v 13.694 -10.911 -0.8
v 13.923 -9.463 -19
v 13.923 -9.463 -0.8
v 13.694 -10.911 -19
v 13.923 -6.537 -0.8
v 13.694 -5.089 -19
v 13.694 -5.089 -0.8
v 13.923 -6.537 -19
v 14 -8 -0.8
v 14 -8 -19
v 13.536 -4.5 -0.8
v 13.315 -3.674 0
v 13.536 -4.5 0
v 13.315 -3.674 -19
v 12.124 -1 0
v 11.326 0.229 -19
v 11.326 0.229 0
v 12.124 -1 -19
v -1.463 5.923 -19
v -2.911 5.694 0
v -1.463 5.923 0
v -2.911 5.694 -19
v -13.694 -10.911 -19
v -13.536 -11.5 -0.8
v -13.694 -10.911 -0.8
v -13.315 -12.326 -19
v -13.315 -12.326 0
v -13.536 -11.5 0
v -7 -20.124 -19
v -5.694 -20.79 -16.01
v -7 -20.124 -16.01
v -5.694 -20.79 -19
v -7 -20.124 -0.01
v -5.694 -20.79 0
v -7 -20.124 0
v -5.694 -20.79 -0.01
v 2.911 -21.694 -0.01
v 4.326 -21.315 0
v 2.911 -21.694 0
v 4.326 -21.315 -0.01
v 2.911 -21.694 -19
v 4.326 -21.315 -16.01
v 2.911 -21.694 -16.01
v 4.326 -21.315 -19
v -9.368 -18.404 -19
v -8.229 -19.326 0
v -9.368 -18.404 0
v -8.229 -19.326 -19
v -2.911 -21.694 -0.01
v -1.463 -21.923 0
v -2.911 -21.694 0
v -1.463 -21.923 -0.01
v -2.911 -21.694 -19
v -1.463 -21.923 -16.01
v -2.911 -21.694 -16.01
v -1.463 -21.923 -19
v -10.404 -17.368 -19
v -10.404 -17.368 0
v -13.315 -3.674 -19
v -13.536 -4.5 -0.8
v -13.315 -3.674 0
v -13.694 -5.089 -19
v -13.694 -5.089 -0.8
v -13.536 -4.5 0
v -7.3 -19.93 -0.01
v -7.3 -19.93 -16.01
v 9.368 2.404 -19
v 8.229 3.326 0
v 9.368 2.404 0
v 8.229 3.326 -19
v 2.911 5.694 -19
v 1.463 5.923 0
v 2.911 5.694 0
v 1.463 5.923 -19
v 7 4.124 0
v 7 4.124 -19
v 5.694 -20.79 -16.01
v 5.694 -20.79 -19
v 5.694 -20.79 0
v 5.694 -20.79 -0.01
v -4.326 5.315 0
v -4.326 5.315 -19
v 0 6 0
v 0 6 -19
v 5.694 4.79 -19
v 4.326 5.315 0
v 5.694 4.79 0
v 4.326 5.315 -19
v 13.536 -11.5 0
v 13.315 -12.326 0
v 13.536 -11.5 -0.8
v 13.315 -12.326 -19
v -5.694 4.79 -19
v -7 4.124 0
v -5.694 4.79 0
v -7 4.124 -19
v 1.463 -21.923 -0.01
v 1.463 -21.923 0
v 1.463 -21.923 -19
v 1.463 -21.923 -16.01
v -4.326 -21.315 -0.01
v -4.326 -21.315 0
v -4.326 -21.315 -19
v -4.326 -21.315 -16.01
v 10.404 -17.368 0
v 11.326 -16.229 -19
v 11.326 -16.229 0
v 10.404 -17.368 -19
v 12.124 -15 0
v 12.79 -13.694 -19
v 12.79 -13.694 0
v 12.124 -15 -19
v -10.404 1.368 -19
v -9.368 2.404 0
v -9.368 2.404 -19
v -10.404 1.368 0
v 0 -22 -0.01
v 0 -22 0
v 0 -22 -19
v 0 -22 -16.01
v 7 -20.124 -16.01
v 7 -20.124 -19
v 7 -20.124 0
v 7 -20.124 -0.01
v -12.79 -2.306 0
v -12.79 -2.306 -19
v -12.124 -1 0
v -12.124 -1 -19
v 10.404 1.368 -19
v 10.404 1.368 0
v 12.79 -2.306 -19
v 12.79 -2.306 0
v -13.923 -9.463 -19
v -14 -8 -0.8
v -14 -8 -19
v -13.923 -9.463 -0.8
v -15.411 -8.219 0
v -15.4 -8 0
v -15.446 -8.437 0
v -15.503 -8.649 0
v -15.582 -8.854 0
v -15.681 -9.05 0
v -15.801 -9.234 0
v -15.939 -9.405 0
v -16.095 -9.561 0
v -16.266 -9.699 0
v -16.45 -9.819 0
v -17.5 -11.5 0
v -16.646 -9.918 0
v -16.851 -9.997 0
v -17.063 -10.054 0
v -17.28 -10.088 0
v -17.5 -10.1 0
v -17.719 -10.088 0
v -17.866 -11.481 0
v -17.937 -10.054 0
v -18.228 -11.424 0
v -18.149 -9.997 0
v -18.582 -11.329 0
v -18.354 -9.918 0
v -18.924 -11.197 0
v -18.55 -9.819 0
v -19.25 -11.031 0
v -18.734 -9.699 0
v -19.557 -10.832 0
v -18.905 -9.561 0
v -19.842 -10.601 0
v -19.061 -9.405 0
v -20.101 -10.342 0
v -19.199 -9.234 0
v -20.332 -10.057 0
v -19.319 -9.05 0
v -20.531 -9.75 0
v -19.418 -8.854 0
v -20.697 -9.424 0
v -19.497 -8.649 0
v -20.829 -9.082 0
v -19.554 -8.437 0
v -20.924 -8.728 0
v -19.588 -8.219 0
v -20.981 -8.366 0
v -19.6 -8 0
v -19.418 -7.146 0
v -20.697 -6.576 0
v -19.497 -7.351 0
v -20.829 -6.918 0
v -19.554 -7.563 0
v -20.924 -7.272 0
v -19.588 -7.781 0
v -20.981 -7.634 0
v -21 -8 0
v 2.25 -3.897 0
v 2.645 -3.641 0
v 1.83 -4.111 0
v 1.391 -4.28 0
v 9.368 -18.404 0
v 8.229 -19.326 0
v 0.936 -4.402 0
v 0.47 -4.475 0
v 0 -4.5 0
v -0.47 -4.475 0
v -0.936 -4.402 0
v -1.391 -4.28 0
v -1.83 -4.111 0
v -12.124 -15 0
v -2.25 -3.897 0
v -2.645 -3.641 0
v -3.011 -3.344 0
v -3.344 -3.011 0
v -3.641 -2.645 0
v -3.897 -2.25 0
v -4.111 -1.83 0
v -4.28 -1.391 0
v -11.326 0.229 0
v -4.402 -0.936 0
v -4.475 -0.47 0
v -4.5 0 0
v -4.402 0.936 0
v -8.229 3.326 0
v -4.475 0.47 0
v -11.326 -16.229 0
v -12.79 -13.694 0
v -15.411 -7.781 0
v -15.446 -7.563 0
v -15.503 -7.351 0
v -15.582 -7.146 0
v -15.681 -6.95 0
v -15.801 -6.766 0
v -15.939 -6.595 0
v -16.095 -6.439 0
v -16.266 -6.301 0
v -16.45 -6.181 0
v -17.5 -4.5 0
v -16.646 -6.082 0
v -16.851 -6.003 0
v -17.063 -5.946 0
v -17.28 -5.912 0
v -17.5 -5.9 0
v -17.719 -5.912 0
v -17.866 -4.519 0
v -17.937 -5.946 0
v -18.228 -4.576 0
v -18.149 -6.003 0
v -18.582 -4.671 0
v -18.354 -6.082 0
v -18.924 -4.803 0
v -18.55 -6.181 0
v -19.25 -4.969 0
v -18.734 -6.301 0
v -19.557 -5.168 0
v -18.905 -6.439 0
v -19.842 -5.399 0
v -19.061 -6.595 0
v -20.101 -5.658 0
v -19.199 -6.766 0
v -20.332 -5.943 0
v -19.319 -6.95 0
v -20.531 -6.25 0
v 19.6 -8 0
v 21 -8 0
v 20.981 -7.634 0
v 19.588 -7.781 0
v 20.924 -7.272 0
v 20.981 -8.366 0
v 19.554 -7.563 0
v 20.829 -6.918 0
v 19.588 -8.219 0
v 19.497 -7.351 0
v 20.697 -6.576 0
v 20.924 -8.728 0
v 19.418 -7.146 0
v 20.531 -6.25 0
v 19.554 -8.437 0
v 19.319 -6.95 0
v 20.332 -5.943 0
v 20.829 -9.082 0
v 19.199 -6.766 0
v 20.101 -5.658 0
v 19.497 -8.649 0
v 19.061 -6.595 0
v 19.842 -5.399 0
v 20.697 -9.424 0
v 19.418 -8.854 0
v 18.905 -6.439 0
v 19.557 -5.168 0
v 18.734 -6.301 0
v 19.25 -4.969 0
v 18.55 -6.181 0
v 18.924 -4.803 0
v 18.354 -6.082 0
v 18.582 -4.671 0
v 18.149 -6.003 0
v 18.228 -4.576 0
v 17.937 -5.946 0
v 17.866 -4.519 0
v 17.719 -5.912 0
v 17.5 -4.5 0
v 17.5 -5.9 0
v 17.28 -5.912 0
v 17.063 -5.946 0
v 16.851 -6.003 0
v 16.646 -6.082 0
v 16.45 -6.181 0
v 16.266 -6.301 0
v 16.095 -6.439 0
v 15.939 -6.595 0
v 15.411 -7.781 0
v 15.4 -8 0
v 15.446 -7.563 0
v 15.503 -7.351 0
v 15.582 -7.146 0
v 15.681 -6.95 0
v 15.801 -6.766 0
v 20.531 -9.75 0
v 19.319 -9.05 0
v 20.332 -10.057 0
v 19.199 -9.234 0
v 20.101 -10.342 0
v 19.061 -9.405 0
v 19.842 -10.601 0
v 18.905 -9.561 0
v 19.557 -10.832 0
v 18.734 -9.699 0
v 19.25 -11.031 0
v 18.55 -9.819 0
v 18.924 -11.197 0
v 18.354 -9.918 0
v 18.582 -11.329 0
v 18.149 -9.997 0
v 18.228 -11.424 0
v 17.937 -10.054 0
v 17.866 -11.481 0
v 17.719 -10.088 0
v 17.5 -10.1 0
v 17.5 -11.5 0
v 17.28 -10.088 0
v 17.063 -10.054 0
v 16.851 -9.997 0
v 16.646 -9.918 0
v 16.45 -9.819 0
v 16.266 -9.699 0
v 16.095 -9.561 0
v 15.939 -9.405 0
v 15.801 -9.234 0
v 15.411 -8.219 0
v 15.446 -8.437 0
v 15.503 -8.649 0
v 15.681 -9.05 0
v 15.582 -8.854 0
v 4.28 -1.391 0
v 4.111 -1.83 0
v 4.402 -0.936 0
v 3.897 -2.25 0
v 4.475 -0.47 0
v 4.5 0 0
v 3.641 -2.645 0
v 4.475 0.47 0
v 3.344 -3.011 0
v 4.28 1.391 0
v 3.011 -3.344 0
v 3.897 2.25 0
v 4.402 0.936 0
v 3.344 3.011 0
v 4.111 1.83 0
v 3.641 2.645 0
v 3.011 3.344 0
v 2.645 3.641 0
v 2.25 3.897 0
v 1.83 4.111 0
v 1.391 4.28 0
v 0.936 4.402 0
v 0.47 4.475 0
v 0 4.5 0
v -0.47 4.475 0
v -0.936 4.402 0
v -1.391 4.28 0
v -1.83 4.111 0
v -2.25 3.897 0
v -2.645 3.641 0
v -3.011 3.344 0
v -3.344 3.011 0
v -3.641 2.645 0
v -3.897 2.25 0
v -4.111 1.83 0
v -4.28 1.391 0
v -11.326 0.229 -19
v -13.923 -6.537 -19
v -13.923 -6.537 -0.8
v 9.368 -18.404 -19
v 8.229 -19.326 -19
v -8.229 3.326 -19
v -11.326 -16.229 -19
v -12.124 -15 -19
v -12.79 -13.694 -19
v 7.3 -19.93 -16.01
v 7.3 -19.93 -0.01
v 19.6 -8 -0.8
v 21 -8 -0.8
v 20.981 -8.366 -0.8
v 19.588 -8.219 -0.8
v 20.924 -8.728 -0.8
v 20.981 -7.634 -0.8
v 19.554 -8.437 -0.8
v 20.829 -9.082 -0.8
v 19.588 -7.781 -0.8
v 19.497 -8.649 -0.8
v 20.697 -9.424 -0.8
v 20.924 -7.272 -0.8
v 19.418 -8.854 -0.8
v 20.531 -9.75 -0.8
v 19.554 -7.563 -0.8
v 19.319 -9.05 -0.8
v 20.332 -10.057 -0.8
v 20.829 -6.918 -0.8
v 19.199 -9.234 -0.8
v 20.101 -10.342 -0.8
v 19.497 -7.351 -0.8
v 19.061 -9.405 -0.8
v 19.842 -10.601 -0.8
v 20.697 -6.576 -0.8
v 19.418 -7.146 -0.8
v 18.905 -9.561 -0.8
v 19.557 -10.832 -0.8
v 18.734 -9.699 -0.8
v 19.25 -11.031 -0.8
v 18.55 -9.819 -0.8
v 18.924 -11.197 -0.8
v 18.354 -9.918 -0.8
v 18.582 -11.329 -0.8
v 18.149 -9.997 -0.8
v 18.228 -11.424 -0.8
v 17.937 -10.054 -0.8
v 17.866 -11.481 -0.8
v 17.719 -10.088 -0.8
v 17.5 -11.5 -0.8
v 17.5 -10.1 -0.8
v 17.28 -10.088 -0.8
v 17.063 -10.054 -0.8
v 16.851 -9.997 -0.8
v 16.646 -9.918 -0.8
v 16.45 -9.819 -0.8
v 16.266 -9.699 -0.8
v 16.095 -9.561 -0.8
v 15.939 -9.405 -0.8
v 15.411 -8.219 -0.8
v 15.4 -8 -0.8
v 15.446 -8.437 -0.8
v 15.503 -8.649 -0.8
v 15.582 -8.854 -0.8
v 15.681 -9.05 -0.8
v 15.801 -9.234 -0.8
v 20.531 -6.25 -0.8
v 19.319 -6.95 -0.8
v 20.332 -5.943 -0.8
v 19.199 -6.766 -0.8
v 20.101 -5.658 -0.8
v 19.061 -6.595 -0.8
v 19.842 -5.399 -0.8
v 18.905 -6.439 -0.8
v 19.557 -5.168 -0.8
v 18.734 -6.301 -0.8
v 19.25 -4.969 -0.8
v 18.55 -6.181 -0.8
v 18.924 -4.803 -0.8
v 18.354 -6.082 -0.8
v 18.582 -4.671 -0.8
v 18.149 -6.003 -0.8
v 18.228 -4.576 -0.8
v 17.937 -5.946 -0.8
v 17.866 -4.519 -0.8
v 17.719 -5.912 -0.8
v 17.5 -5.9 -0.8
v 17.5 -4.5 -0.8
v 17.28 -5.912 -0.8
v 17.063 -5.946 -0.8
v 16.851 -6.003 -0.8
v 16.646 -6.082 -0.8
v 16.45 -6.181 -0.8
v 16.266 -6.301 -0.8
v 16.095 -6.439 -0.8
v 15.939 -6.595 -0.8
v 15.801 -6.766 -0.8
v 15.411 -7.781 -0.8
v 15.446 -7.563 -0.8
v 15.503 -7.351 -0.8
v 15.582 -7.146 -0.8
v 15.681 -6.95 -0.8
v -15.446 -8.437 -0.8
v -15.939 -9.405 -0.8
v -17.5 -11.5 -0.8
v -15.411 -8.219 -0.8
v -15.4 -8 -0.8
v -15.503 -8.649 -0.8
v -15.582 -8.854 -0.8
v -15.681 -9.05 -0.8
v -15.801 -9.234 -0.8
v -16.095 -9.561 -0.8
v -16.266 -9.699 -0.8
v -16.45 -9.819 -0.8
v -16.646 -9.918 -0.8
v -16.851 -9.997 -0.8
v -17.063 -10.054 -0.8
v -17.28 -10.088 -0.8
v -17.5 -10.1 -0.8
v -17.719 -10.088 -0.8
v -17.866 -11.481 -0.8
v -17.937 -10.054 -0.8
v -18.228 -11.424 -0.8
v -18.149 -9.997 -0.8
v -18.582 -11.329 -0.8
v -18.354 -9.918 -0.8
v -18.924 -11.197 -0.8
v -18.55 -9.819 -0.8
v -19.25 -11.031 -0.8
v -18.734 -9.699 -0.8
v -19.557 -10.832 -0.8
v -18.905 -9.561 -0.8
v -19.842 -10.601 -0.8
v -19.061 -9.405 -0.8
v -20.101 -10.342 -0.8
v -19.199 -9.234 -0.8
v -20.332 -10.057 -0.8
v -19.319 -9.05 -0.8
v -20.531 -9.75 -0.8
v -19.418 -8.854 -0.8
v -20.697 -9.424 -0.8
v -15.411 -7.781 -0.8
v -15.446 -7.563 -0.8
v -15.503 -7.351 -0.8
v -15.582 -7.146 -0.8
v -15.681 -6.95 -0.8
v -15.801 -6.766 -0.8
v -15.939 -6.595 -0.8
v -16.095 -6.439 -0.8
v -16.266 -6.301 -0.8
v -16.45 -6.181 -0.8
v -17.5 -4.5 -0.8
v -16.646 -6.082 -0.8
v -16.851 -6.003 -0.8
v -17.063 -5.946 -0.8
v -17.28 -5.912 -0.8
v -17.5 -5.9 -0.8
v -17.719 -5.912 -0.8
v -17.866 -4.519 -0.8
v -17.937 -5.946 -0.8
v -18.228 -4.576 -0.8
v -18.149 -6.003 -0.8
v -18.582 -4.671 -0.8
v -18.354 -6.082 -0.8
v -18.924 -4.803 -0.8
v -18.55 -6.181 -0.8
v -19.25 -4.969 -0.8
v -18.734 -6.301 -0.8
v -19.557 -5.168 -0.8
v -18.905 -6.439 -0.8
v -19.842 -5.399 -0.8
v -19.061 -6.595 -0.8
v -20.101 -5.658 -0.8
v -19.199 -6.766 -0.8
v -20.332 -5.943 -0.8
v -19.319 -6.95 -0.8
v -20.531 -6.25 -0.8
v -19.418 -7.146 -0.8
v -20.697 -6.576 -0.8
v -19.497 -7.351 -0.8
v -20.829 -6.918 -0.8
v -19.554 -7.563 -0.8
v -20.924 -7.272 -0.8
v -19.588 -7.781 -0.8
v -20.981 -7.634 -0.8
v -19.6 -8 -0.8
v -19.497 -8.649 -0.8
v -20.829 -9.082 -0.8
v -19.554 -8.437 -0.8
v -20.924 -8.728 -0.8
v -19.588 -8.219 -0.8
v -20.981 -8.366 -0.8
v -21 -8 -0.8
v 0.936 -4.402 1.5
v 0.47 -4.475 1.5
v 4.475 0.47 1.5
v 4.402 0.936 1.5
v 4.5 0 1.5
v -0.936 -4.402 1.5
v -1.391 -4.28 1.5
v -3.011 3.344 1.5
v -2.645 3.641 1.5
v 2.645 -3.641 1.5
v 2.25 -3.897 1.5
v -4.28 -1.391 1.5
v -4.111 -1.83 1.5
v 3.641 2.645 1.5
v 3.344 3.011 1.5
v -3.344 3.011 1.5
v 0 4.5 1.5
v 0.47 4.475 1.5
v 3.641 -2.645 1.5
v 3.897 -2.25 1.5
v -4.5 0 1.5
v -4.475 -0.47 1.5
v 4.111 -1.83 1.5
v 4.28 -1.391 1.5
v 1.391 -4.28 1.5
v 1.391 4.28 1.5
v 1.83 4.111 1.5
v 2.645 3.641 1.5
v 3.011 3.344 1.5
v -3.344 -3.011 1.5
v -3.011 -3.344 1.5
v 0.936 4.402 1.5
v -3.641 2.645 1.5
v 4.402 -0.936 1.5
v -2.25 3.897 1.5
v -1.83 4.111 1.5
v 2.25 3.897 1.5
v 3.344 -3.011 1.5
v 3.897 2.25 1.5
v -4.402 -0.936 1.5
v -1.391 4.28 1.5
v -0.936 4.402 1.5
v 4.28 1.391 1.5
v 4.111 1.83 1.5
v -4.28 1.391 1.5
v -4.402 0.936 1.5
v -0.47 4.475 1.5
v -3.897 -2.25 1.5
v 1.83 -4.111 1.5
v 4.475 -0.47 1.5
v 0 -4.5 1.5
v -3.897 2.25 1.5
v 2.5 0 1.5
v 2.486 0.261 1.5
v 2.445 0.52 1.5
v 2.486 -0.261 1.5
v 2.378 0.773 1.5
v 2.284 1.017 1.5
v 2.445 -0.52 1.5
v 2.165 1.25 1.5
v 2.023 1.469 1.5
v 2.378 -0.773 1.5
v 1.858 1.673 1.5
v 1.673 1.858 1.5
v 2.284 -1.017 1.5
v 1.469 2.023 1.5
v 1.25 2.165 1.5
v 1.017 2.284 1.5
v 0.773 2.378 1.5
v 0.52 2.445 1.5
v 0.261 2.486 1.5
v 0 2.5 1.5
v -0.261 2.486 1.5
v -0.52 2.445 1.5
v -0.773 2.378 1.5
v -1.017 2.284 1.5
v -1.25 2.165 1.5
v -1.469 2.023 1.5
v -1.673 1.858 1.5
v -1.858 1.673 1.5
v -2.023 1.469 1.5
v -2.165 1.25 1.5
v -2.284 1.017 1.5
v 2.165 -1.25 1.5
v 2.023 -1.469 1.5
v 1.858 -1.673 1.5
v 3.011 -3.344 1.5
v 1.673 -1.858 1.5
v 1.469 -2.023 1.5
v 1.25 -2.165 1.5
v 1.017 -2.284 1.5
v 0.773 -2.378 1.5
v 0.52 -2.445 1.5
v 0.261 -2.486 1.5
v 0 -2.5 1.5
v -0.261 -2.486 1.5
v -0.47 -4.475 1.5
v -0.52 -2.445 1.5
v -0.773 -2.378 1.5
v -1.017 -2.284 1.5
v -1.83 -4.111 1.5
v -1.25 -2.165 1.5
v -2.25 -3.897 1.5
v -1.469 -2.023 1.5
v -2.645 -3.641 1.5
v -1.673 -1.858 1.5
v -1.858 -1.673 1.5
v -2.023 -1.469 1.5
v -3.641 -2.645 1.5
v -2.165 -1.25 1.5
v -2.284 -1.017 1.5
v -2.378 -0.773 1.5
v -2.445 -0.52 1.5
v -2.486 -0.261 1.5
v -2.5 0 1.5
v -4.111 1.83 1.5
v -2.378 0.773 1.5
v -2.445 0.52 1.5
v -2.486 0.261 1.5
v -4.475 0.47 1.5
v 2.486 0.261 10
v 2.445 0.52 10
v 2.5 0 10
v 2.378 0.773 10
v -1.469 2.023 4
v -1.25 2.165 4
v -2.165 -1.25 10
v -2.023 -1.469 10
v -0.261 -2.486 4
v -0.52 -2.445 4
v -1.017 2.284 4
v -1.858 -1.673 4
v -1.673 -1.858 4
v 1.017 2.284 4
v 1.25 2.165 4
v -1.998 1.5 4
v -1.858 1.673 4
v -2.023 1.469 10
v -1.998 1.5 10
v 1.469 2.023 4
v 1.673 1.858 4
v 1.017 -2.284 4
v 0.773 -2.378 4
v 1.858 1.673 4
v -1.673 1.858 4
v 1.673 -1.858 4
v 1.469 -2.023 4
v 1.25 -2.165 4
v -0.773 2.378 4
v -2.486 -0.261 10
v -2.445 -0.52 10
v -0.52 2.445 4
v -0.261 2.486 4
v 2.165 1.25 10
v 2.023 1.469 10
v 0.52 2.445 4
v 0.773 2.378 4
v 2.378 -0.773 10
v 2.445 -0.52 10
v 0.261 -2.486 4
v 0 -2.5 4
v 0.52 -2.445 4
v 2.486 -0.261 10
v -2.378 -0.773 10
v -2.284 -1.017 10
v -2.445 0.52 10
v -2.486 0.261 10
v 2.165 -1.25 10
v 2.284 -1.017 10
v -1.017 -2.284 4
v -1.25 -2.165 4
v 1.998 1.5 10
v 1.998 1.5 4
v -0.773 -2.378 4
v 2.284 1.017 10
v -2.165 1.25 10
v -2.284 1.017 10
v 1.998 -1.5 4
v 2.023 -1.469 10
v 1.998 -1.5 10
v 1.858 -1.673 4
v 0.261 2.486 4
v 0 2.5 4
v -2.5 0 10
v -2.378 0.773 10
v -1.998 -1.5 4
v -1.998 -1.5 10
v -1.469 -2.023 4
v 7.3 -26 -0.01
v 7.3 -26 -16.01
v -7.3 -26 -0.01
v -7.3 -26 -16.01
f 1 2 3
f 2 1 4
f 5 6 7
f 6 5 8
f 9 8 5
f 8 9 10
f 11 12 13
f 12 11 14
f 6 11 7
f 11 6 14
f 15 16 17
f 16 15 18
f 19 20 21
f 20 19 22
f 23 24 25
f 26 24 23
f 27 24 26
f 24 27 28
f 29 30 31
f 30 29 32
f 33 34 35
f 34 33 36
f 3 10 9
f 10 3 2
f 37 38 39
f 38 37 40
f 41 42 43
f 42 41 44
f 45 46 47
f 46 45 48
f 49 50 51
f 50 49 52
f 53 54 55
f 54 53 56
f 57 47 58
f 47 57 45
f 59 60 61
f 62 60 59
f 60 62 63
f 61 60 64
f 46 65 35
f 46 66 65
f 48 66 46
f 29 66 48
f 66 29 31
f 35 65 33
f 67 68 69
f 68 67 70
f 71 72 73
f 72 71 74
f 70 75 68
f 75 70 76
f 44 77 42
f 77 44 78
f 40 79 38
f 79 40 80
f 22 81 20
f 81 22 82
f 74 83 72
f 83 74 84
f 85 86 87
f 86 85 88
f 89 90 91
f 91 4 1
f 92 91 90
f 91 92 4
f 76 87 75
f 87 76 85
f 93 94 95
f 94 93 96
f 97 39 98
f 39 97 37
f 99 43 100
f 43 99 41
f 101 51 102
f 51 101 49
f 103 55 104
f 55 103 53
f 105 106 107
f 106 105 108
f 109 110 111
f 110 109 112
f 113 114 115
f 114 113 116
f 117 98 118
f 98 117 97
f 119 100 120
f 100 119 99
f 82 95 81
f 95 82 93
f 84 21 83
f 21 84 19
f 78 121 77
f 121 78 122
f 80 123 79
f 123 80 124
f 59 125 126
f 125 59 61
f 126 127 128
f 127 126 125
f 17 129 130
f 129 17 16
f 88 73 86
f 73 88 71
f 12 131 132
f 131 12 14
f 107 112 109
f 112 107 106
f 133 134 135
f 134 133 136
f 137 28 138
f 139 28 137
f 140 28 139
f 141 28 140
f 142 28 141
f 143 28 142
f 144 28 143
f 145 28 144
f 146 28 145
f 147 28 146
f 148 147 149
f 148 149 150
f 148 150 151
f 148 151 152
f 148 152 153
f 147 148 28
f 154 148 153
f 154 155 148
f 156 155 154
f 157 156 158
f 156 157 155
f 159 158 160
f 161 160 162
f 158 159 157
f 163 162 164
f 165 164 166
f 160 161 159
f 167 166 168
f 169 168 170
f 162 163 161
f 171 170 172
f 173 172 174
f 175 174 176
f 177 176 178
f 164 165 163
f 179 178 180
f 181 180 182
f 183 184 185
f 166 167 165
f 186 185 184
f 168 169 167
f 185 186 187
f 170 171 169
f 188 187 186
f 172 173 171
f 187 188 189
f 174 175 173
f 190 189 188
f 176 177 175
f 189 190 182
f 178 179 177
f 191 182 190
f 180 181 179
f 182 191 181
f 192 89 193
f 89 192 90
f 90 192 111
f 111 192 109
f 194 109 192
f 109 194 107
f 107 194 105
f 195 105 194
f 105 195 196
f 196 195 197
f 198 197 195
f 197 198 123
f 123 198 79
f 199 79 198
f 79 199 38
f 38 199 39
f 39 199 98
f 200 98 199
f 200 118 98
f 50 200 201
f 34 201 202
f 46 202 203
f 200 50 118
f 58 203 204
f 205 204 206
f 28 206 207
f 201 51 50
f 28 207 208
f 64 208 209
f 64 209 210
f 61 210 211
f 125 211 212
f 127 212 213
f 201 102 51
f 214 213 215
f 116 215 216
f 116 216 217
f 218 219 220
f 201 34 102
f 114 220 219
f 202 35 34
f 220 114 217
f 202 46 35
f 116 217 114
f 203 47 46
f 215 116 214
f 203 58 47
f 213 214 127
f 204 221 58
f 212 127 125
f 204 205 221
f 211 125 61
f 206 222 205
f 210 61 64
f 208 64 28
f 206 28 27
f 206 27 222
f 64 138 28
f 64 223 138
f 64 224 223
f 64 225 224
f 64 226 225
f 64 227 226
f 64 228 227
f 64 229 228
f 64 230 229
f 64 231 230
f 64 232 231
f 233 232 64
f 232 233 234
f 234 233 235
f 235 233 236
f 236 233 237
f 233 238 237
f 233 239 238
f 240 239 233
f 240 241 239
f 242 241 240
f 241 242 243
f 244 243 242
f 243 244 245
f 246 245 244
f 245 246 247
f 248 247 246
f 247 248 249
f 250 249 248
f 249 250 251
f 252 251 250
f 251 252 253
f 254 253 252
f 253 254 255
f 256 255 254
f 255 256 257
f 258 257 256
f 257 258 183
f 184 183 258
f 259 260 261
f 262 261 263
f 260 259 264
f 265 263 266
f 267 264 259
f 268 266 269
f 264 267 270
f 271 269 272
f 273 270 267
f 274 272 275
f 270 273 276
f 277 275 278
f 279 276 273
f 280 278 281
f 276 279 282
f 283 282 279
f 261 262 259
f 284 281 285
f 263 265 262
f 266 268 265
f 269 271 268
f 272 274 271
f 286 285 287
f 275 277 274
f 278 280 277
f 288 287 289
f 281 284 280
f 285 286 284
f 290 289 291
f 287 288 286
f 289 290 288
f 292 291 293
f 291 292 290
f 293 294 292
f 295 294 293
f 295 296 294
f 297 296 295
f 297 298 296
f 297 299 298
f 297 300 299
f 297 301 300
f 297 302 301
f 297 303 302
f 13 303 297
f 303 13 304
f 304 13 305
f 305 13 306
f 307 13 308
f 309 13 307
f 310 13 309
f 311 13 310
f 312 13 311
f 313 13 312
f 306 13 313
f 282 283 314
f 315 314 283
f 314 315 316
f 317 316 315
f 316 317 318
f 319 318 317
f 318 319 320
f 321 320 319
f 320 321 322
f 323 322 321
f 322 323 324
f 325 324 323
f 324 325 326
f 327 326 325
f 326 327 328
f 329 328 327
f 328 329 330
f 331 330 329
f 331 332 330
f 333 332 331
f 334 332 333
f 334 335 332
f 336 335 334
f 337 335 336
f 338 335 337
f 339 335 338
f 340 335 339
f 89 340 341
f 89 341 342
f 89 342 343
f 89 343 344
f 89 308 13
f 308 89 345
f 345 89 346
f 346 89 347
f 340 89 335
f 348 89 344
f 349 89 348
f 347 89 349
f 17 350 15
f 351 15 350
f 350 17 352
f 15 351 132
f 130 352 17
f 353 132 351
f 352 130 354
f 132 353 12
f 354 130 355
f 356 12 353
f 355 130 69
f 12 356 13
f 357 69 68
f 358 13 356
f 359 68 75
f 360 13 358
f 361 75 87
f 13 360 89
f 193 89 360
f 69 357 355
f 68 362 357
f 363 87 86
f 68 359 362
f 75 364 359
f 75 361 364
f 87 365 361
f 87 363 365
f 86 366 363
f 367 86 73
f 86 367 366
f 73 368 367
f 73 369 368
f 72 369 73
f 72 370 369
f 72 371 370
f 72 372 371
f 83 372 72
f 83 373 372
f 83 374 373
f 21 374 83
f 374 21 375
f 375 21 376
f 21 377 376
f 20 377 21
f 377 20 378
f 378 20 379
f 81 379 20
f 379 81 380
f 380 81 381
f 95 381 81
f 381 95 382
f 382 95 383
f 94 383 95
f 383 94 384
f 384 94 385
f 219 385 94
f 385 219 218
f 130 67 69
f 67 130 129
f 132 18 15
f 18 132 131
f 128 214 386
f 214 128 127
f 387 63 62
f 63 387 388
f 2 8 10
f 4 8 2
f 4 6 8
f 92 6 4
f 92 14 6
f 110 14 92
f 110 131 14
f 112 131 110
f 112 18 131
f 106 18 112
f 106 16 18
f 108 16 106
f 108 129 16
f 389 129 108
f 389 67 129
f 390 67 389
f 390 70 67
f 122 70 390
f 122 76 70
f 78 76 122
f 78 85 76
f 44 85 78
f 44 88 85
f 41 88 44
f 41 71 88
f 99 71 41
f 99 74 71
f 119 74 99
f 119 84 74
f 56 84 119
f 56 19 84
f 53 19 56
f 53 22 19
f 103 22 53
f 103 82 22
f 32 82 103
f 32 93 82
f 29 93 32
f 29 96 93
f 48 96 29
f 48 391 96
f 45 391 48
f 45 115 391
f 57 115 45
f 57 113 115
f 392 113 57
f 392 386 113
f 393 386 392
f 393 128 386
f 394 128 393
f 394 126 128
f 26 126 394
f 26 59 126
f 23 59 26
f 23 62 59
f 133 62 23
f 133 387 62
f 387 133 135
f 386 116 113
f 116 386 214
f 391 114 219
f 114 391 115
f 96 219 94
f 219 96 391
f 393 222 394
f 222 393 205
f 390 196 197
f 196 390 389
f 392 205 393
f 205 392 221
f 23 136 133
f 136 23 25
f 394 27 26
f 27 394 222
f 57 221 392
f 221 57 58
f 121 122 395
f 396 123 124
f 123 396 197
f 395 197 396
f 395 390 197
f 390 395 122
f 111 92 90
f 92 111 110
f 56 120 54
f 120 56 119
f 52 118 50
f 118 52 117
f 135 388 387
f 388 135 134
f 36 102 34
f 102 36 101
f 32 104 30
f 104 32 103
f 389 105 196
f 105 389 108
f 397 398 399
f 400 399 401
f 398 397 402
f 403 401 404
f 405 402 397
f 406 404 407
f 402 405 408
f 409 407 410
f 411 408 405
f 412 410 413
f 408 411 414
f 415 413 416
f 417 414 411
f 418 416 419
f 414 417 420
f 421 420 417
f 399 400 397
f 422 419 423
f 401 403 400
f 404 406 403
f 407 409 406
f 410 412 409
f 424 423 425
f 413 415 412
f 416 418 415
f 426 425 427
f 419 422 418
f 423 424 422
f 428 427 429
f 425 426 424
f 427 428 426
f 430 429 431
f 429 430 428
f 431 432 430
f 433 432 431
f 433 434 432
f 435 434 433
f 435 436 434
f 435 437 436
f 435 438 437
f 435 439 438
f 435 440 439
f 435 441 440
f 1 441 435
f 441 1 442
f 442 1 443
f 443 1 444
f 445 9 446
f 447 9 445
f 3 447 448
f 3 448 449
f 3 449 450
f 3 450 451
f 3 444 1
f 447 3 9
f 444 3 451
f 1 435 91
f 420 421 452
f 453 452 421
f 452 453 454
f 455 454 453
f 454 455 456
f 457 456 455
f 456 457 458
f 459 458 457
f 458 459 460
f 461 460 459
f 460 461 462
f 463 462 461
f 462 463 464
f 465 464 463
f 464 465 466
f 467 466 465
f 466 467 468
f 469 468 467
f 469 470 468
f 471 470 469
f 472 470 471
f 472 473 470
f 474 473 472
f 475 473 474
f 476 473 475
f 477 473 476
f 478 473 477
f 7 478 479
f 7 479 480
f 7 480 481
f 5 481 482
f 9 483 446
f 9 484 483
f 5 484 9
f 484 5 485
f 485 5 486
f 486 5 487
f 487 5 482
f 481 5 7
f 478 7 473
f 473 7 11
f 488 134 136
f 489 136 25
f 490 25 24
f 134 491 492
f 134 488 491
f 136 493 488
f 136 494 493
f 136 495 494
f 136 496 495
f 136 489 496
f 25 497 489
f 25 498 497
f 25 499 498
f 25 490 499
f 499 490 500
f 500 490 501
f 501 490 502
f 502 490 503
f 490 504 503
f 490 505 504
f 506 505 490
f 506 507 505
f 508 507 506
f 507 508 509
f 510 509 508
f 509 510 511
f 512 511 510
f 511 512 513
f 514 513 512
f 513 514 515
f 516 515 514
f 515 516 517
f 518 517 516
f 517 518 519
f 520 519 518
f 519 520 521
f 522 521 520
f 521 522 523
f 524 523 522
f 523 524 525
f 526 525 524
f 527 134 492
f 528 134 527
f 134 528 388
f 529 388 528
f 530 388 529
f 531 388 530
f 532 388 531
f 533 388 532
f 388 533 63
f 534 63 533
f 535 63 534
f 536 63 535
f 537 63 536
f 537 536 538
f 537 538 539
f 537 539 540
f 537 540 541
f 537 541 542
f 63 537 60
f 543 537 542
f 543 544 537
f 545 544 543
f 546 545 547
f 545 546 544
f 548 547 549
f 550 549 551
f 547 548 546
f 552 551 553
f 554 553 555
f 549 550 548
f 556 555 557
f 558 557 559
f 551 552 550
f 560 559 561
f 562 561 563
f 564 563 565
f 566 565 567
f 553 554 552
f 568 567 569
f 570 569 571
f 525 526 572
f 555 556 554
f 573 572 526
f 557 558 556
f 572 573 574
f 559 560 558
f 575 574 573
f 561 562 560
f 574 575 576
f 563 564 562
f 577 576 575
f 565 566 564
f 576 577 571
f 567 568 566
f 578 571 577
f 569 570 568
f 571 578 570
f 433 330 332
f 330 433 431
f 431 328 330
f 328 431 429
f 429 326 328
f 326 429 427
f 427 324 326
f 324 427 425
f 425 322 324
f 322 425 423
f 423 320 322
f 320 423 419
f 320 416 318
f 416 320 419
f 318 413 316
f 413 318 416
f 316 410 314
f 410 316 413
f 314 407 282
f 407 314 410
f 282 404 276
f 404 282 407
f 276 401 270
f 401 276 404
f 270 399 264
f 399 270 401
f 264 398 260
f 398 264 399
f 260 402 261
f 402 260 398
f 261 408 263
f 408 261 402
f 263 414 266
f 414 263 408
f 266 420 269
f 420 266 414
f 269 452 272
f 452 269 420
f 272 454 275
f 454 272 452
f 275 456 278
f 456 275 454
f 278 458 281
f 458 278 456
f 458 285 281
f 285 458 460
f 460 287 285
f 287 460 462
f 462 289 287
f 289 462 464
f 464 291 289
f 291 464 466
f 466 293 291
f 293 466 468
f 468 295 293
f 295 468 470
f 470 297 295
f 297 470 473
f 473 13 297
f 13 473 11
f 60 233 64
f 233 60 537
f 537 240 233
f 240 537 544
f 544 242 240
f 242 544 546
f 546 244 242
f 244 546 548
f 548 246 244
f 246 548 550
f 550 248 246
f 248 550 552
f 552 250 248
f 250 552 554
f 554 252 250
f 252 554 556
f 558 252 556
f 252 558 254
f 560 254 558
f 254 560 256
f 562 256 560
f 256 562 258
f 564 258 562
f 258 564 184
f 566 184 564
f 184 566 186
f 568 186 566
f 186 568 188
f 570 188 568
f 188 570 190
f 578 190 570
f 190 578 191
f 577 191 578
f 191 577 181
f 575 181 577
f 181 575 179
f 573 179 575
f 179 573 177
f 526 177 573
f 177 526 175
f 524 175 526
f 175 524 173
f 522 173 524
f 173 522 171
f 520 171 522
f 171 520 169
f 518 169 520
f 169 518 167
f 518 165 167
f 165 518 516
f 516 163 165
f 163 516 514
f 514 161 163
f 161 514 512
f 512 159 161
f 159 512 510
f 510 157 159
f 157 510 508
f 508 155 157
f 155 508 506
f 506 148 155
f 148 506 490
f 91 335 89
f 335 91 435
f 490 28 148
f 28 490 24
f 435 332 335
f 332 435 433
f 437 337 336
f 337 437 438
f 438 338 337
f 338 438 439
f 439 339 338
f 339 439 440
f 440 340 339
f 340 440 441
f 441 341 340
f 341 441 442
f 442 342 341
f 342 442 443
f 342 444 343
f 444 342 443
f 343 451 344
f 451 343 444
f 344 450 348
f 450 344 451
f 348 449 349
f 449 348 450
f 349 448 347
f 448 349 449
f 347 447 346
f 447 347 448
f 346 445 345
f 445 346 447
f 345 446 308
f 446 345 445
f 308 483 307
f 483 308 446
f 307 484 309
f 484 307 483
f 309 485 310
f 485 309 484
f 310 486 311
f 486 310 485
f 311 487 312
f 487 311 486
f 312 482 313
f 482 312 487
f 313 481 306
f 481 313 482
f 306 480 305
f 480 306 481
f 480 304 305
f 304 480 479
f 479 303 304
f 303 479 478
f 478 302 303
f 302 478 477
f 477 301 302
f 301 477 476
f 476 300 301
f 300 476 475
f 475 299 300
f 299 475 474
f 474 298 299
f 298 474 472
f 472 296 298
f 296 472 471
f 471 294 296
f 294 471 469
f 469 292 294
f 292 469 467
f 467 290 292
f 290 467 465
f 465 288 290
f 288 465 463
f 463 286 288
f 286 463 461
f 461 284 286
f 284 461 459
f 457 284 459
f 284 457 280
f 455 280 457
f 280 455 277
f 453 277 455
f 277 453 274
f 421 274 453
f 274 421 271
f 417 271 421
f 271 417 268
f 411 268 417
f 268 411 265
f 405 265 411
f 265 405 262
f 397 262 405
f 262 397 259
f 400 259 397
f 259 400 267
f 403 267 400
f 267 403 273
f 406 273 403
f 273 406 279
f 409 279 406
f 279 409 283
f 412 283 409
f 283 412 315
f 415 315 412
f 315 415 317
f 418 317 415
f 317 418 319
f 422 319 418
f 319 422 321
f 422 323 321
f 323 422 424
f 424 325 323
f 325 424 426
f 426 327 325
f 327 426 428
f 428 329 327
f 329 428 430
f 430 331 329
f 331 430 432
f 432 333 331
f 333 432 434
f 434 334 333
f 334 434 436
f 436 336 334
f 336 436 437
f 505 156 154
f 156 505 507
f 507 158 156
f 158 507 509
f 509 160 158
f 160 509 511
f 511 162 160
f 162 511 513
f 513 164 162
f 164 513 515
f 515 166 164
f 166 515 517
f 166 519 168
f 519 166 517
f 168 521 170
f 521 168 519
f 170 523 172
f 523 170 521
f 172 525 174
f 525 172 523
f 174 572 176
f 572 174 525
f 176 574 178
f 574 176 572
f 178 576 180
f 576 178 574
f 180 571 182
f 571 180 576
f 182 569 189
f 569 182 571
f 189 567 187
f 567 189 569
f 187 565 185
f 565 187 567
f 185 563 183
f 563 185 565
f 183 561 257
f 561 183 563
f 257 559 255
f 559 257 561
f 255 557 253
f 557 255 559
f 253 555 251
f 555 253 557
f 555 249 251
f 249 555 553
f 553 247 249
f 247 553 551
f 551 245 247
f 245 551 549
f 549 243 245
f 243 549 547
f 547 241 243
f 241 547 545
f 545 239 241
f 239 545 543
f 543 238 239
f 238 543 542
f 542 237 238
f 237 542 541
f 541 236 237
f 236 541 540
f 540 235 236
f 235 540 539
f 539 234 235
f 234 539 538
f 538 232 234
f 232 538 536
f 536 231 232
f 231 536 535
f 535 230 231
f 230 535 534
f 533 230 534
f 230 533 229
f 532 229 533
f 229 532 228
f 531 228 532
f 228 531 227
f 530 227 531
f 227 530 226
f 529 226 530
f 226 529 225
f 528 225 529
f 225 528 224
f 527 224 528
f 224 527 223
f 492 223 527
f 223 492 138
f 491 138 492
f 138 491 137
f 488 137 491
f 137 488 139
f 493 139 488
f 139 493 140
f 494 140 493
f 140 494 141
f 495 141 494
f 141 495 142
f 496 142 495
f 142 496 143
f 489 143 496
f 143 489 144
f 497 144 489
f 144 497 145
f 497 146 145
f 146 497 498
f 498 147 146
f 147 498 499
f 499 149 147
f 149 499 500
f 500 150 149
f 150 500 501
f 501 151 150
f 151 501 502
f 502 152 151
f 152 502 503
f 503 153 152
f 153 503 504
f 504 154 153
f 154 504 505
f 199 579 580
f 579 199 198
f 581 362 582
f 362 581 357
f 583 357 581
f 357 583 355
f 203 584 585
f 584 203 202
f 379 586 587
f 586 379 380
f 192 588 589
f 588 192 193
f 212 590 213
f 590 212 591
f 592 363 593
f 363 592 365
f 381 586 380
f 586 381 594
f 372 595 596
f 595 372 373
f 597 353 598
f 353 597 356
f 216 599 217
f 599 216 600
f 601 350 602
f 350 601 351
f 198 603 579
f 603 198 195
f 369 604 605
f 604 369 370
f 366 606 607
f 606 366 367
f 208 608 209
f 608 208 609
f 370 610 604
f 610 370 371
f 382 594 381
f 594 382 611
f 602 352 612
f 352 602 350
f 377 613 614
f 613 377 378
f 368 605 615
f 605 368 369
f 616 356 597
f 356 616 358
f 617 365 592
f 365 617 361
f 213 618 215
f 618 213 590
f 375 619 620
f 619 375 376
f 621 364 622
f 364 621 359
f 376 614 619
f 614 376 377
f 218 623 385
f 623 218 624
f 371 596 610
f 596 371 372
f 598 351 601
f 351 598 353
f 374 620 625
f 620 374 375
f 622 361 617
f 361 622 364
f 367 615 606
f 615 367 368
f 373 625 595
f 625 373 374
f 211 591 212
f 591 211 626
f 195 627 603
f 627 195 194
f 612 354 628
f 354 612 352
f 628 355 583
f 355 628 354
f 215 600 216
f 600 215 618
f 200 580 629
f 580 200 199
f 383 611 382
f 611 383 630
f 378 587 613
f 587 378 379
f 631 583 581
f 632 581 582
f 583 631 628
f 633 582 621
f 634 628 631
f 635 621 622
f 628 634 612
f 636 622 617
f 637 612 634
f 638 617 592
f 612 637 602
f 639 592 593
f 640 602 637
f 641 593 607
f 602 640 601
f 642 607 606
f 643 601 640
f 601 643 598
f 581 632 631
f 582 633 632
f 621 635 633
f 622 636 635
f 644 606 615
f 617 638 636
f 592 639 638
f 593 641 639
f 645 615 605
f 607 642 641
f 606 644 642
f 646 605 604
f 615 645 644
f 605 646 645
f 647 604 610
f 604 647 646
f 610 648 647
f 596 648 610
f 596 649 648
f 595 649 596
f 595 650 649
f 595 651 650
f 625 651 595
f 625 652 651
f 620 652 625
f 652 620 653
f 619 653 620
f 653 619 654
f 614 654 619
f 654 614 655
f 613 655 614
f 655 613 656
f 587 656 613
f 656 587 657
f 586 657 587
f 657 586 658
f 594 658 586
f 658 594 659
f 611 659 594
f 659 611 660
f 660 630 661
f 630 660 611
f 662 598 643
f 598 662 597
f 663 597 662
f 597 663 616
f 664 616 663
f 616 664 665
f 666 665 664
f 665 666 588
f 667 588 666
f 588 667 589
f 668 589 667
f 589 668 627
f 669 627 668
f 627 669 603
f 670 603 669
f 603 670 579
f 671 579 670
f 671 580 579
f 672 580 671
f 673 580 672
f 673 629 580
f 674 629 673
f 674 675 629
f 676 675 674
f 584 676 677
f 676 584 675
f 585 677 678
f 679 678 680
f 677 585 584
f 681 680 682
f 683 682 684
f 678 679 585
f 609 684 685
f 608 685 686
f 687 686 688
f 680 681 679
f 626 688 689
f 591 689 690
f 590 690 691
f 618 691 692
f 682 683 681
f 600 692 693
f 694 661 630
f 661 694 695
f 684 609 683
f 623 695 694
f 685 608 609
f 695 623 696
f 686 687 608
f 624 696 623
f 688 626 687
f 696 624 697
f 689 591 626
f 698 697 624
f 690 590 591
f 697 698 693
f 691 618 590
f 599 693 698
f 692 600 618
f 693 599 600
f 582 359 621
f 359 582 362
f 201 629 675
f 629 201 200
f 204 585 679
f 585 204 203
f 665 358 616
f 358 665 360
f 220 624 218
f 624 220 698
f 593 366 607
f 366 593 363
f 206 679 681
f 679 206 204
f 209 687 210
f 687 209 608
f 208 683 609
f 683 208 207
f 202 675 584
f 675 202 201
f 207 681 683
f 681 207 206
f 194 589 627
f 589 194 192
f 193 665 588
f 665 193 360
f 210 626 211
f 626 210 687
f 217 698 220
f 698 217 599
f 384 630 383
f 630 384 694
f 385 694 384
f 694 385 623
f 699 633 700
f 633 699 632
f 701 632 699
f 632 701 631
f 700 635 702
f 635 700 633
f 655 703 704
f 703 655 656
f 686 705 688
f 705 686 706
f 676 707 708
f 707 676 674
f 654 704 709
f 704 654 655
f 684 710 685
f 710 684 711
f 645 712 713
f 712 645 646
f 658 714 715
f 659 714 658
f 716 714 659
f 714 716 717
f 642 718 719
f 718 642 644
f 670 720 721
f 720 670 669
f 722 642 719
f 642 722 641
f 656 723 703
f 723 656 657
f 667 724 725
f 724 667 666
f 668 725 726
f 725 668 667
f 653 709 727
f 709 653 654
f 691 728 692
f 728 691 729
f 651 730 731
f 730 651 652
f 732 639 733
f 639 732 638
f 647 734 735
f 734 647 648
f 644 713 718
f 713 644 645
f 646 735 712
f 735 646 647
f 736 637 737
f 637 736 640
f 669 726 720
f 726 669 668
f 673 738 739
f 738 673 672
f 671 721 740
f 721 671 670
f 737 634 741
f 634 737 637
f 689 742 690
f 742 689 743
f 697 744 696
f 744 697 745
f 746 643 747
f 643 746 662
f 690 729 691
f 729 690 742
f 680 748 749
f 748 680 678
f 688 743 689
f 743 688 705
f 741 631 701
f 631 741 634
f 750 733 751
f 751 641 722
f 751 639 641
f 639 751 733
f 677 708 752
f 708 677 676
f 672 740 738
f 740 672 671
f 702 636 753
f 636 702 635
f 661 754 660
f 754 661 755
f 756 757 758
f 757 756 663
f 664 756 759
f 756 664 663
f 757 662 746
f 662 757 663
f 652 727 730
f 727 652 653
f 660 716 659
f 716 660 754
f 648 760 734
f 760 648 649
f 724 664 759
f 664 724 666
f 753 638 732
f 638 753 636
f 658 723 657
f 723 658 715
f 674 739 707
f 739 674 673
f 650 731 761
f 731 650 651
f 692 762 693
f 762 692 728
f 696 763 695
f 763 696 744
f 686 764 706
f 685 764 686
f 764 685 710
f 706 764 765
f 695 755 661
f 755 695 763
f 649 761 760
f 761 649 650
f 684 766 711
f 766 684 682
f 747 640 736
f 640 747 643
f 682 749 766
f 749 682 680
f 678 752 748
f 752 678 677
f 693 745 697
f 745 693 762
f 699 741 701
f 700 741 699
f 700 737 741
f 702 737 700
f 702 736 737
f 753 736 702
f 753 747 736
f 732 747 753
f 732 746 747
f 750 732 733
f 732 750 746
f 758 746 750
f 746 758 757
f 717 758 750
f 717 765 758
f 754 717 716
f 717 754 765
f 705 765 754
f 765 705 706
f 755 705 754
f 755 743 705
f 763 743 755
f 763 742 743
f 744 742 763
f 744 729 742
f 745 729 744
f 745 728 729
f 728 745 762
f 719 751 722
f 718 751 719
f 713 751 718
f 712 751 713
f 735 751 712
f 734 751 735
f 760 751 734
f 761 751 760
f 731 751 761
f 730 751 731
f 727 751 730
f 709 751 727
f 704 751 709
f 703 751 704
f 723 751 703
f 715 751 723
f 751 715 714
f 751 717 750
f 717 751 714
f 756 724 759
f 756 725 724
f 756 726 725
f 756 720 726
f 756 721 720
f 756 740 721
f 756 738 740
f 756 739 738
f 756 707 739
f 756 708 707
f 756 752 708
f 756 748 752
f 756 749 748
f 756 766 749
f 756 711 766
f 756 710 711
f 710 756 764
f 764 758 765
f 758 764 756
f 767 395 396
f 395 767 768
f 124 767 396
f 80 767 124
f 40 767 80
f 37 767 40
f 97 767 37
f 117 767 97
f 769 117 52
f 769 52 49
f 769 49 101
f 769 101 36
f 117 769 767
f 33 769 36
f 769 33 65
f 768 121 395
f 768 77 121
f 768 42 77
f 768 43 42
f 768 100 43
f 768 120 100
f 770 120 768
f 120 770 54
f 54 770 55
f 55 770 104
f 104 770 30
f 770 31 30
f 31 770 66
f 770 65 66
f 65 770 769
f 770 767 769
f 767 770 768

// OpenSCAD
/*
   Copyright 2015 Scott Bezek

   Licensed under the Apache License, Version 2.0 (the "License");
   you may not use this file except in compliance with the License.
   You may obtain a copy of the License at

       http://www.apache.org/licenses/LICENSE-2.0

   Unless required by applicable law or agreed to in writing, software
   distributed under the License is distributed on an "AS IS" BASIS,
   WITHOUT WARRANTIES OR CONDITIONS OF ANY KIND, either express or implied.
   See the License for the specific language governing permissions and
   limitations under the License.
*/

// Basic 28BYJ-48 model based on various dimensioned drawings.
// Origin is centered on the shaft, on the front face of the motor, with the shaft in the +z direction
module Stepper28BYJ48() {
    $fn = 60;

    eps = 0.01;
    chassis_radius = 28/2;
    chassis_height = 19;
    shaft_offset = 8;
    mount_outer_radius = 3.5;
    mount_hole_radius = 4.2/2;
    mount_center_offset = 35/2;
    mount_bracket_height = 0.8;

    shaft_collar_radius = 9/2;
    shaft_collar_height = 1.5;

    shaft_radius = 5/2;
    shaft_height = 10;
    shaft_slotted_width = 3;
    shaft_slotted_height = 6;

    backpack_width = 14.6;
    backpack_extent = 18; // seen values from 17-18
    backpack_height = 16;

    gray = [0.7, 0.7, 0.7];
    gold = "gold";
    blue = "blue";

    module mounting_holes() {
        linear_extrude(height=mount_bracket_height) {
        difference() {
            hull() {
                translate([mount_center_offset, 0]) {
                    circle(r=mount_outer_radius);
                }
                translate([-mount_center_offset, 0]) {
                    circle(r=mount_outer_radius);
                }
            }

            translate([mount_center_offset, 0]) {
                circle(r=mount_hole_radius);
            }
            translate([-mount_center_offset, 0]) {
                circle(r=mount_hole_radius);
            }
        }
        }
    }

    module shaft_collar() {
        cylinder(r=shaft_collar_radius, h=shaft_collar_height + eps);
    }

    module shaft() {
        color(gold) {
            difference() {
                cylinder(r=shaft_radius, h=shaft_height);
                translate([-(shaft_radius + eps), shaft_slotted_width / 2, shaft_height - shaft_slotted_height]) {
                    cube([(shaft_radius+eps)*2, shaft_radius, shaft_slotted_height+eps]);
                }
                translate([-(shaft_radius + eps), - shaft_radius - (shaft_slotted_width / 2), shaft_height - shaft_slotted_height]) {
                    cube([(shaft_radius+eps)*2, shaft_radius, shaft_slotted_height+eps]);
                }
            }
        }
    }

    module chassis() {
        color(gray) {
            translate([0, 0, -chassis_height]) {
                cylinder(r=chassis_radius, h=chassis_height);
            }
            translate([0, 0, -mount_bracket_height]) {
                mounting_holes();
            }
            translate([0, shaft_offset, -eps]) {
                shaft_collar();
            }
        }
    }

    module backpack() {
        color(blue) {
            translate([-backpack_width/2, 0, -backpack_height - eps]) {
                cube([backpack_width, backpack_extent, backpack_height]);
            }
        }
    }

    translate([0, -shaft_offset, 0]) {
        chassis();
        translate([0, shaft_offset, 0]) {
            shaft();
        }
        translate([0, -backpack_extent, 0]) {
            backpack();
        }
    }
}

Stepper28BYJ48();
